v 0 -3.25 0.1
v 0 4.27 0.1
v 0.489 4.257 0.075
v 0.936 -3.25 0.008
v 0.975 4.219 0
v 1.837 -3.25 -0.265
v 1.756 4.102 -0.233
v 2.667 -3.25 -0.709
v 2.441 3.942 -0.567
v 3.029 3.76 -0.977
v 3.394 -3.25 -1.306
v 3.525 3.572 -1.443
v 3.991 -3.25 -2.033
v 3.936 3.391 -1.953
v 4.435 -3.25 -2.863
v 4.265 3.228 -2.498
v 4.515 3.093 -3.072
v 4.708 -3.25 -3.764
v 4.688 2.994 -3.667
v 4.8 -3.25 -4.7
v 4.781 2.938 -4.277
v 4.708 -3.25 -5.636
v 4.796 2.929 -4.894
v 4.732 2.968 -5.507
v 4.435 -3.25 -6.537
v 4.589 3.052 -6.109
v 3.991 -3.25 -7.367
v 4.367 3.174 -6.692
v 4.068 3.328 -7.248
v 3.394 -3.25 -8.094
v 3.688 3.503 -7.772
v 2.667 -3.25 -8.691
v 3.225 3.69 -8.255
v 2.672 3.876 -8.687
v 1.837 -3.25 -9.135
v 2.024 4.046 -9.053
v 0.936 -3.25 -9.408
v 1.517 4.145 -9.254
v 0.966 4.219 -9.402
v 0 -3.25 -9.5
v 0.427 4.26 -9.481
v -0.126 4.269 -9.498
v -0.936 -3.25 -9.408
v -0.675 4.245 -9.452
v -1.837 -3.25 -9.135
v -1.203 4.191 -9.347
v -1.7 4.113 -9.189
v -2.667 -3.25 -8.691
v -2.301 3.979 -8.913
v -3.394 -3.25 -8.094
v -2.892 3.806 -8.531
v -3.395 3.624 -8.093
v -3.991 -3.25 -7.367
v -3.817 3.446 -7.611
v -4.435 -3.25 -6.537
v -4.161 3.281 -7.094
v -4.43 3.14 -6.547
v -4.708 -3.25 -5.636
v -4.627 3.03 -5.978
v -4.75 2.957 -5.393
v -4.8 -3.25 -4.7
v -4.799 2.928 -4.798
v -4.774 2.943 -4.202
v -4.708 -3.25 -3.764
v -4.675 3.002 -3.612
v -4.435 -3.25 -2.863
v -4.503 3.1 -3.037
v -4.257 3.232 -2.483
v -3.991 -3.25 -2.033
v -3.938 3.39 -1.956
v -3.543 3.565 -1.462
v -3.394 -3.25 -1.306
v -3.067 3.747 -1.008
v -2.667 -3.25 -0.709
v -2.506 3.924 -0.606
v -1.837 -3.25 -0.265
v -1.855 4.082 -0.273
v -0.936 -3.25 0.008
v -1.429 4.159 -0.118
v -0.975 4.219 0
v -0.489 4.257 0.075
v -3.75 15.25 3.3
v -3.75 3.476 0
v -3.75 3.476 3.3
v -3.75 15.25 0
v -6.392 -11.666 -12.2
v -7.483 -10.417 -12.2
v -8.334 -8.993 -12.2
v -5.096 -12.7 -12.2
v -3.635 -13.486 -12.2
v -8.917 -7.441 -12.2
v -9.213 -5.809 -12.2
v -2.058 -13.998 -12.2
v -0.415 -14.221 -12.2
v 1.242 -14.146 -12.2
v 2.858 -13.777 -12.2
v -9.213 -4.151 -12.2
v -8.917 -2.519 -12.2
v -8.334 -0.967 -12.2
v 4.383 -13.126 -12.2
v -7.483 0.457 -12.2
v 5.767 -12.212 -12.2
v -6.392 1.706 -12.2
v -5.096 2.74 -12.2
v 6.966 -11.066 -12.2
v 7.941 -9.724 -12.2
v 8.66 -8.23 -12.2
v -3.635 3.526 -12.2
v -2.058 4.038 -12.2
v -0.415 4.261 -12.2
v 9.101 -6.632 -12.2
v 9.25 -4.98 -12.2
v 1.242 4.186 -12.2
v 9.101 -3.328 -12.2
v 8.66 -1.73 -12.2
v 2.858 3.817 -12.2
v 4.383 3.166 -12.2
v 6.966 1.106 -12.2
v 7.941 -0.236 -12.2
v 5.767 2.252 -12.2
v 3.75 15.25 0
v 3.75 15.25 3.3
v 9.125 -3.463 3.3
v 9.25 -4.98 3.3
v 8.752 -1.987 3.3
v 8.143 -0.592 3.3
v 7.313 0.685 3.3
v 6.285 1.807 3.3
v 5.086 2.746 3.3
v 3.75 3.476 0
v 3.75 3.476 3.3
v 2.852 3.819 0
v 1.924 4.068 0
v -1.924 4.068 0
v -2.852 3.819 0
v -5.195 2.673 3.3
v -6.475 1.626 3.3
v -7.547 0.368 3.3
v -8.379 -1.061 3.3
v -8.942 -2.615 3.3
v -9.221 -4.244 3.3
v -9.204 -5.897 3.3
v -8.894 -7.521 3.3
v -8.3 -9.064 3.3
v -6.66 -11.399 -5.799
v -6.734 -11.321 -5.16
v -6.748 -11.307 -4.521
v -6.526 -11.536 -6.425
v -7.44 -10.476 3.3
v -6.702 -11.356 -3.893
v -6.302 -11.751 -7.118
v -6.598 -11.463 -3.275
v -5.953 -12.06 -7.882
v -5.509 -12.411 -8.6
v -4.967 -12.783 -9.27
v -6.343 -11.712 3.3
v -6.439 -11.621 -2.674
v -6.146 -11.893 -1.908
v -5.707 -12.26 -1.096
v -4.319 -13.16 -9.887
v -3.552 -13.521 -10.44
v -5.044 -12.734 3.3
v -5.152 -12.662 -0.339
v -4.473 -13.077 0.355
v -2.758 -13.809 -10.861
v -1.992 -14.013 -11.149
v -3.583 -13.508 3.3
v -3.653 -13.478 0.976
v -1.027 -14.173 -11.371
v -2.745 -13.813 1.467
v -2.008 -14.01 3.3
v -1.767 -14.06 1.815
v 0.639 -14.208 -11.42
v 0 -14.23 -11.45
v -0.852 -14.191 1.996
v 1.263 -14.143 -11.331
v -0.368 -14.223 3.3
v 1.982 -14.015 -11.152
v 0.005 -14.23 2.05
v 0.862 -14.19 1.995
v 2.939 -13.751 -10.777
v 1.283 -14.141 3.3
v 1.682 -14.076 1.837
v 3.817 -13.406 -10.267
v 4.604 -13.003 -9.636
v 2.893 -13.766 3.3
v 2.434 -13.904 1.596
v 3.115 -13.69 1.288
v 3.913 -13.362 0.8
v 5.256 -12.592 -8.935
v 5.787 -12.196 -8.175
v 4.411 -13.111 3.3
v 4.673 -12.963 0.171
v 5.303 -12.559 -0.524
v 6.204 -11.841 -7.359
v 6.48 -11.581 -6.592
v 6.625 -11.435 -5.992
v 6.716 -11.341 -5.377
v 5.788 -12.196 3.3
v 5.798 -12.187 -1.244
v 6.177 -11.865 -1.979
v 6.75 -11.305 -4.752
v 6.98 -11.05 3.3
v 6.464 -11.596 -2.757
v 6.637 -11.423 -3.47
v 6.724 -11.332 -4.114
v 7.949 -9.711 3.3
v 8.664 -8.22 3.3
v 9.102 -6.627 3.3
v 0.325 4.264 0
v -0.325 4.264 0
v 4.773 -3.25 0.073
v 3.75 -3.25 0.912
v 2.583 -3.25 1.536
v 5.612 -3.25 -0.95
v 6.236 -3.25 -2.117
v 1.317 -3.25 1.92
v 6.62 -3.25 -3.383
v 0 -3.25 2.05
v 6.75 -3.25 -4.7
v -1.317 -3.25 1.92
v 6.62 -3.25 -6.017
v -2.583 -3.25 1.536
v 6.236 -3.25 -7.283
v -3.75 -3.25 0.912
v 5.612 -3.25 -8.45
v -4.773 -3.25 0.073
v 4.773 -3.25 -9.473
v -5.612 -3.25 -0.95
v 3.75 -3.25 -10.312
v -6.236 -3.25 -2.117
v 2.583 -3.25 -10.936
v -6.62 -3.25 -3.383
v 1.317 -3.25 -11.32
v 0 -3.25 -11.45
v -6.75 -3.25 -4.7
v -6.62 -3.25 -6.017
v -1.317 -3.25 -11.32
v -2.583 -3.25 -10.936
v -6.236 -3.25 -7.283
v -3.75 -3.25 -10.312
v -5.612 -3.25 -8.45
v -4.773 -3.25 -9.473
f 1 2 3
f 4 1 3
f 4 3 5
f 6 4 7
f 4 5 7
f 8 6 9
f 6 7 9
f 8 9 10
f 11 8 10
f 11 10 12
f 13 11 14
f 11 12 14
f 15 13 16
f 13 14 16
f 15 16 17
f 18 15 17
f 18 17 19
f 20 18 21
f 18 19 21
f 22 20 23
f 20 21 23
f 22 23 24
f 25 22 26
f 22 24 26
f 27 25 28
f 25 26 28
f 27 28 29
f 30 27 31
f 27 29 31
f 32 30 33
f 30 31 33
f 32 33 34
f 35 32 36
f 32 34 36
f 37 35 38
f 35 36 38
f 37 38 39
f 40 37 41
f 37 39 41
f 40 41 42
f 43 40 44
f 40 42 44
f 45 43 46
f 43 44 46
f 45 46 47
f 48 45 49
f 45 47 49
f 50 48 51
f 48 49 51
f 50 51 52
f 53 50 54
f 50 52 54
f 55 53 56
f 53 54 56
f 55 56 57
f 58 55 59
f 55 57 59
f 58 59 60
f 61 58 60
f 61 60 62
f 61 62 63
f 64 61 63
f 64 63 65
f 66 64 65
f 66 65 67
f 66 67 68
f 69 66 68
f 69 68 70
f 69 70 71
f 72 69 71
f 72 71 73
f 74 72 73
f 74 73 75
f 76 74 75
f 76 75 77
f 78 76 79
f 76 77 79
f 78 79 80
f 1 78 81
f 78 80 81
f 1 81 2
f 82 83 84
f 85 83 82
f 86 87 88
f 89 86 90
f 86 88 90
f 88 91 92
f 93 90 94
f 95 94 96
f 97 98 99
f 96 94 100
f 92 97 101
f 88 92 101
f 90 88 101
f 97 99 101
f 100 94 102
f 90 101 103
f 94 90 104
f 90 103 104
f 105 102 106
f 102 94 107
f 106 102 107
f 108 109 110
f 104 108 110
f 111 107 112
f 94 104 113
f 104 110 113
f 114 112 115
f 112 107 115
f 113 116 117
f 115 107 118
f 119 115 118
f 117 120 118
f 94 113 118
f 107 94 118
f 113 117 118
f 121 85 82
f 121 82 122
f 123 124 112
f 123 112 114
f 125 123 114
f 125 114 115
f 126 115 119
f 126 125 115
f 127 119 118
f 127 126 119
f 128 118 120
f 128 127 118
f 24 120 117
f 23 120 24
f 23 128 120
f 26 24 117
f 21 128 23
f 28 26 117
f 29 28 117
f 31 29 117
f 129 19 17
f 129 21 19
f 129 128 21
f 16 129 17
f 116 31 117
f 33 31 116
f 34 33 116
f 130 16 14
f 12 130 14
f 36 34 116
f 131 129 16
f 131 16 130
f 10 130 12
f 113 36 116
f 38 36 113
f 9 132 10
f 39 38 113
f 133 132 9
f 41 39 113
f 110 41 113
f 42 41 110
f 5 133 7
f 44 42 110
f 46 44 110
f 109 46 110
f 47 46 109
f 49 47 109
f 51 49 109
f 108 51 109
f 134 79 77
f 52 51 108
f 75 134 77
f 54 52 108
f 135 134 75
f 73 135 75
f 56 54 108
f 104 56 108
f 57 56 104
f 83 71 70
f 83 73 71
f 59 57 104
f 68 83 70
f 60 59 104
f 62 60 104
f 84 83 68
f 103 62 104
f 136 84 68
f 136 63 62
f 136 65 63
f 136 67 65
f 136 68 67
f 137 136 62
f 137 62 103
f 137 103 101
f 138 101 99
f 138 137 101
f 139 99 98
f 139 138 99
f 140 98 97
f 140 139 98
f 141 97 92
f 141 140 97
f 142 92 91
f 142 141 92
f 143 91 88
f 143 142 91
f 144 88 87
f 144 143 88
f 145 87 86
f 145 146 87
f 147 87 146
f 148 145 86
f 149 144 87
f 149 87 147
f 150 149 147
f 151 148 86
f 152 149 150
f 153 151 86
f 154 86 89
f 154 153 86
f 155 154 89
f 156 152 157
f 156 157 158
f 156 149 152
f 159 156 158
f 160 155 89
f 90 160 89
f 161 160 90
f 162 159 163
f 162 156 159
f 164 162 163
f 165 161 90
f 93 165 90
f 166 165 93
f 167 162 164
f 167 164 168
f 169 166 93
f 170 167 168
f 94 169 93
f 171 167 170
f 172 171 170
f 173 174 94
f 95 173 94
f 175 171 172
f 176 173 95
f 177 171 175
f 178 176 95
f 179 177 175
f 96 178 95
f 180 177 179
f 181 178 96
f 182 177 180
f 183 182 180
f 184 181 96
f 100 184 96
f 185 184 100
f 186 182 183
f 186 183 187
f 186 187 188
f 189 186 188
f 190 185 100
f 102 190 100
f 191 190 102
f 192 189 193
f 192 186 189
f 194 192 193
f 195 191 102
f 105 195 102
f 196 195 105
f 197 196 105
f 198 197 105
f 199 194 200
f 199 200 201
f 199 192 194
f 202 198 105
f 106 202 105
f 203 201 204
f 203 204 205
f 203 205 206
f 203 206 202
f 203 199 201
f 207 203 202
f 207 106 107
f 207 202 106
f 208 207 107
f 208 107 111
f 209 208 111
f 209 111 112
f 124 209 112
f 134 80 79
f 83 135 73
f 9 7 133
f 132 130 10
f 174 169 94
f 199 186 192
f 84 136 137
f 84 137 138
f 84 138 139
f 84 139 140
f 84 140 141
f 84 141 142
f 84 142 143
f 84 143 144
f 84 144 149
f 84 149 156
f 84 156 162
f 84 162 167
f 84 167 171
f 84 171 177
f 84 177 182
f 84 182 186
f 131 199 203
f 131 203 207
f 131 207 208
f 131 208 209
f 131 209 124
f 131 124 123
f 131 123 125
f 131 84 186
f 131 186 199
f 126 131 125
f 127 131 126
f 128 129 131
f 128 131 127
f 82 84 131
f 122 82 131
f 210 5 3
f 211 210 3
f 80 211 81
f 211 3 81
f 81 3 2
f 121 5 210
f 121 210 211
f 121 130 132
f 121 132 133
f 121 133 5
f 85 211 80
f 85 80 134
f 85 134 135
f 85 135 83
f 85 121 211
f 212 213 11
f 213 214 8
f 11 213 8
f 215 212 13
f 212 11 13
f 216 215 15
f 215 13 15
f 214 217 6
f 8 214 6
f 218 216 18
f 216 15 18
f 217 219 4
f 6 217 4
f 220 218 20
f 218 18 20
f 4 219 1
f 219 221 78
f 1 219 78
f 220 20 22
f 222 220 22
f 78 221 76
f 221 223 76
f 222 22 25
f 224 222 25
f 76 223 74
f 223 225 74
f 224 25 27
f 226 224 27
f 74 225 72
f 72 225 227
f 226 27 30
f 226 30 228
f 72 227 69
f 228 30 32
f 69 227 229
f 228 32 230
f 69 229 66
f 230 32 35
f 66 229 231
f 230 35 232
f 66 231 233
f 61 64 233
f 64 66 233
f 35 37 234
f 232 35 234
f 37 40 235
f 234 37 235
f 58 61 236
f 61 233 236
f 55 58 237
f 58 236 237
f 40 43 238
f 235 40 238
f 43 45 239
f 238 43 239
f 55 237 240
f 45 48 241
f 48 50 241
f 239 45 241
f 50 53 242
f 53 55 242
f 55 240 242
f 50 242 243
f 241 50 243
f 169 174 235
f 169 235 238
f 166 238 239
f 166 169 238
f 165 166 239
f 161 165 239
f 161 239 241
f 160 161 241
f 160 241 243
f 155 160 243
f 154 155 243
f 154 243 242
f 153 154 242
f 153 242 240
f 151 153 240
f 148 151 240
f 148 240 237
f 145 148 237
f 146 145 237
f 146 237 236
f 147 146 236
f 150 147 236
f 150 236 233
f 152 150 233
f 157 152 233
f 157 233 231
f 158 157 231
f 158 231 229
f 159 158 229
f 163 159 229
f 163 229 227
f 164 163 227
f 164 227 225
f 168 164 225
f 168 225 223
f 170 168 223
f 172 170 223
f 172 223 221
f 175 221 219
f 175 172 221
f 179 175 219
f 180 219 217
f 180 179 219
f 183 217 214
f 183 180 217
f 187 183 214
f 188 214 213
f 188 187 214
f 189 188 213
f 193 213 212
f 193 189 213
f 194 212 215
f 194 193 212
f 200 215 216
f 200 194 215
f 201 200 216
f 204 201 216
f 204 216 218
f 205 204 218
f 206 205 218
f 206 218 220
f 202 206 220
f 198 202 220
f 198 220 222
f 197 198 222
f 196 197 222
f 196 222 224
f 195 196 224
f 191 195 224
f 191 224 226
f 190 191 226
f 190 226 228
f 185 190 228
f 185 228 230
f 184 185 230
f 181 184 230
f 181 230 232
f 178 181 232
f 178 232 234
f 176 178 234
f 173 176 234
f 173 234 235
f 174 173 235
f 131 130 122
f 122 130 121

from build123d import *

# Parameters (mm, degrees)
SKETCH_1_W               = 7.5
SKETCH_1_H               = 30.5
EXTRUDE_1_DEPTH          = 3.3
SKETCH_4_W               = 7.5
SKETCH_4_H               = 8.198435562
CUT_EXTRUDE_1_DEPTH      = 17.047273912
SKETCH_2_R               = 9.25
EXTRUDE_2_DEPTH          = 15.5
SKETCH_5_R               = 4.8
CUT_EXTRUDE_2_DEPTH      = 34.218562582
CUT_EXTRUDE_3_DEPTH      = 2.75
CUT_EXTRUDE_3_DEPTH_BACK = 10
SKETCH_6_R               = 6.75
EXTRUDE_START            = -0.5
EXTRUDE_3_DEPTH          = 0.5


with BuildPart() as part:
    # 草图1 → 凸台-拉伸1 (new body)
    with BuildSketch(Plane.XY):
        Rectangle(SKETCH_1_W, SKETCH_1_H)
    extrude(amount=EXTRUDE_1_DEPTH)

    # 草图4 → 切除-拉伸1 (cut, through all)
    with BuildSketch(Plane(origin=(0, 0, 0), x_dir=(-1, 0, 0), z_dir=(0, 0, -1))):
        with Locations((0, -11.150782219)):
            Rectangle(SKETCH_4_W, SKETCH_4_H)
    extrude(amount=-CUT_EXTRUDE_1_DEPTH, mode=Mode.SUBTRACT)

    # 草图2 → 凸台-拉伸2 (add)
    with BuildSketch(Plane.XY.offset(3.3)):
        with Locations((0, -4.98)):
            Circle(SKETCH_2_R)
    extrude(amount=-EXTRUDE_2_DEPTH)

    # 草图5 → 切除-拉伸2 (cut, through all)
    with BuildSketch(Plane(origin=(0, 15.25, 0), x_dir=(1, 0, 0), z_dir=(0, 1, 0))):
        with Locations(Location((0, 4.7, 0), (0, 0, 270))):
            Circle(SKETCH_5_R)
    extrude(amount=-CUT_EXTRUDE_2_DEPTH, mode=Mode.SUBTRACT)

    # 草图6 → 切除-拉伸3 (cut, two sides: drawn at the far end of the back side and taken through both)
    with BuildSketch(Plane(origin=(0, -6, 0), x_dir=(1, 0, 0), z_dir=(0, 1, 0)).offset(-CUT_EXTRUDE_3_DEPTH_BACK)):
        with Locations(Location((0, 4.7, 0), (0, 0, 90))):
            Circle(SKETCH_6_R)
    extrude(amount=CUT_EXTRUDE_3_DEPTH + CUT_EXTRUDE_3_DEPTH_BACK, mode=Mode.SUBTRACT)

    # 草图7 → 凸台-拉伸3 (add)
    with BuildSketch(Plane(origin=(0, 0, 0), x_dir=(-1, 0, 0), z_dir=(0, 0, -1)).offset(EXTRUDE_START)):
        with BuildLine():
            Line((-0.974679434, 15.25), (-0.974679434, 4.218505313))
            ThreePointArc((-0.974679434, 4.218505313), (0, 4.27), (0.974679434, 4.218505313))
            Line((0.974679434, 4.218505313), (0.974679434, 15.25))
            Line((0.974679434, 15.25), (-0.974679434, 15.25))
        make_face()
    extrude(amount=EXTRUDE_3_DEPTH)


solid = part.part
